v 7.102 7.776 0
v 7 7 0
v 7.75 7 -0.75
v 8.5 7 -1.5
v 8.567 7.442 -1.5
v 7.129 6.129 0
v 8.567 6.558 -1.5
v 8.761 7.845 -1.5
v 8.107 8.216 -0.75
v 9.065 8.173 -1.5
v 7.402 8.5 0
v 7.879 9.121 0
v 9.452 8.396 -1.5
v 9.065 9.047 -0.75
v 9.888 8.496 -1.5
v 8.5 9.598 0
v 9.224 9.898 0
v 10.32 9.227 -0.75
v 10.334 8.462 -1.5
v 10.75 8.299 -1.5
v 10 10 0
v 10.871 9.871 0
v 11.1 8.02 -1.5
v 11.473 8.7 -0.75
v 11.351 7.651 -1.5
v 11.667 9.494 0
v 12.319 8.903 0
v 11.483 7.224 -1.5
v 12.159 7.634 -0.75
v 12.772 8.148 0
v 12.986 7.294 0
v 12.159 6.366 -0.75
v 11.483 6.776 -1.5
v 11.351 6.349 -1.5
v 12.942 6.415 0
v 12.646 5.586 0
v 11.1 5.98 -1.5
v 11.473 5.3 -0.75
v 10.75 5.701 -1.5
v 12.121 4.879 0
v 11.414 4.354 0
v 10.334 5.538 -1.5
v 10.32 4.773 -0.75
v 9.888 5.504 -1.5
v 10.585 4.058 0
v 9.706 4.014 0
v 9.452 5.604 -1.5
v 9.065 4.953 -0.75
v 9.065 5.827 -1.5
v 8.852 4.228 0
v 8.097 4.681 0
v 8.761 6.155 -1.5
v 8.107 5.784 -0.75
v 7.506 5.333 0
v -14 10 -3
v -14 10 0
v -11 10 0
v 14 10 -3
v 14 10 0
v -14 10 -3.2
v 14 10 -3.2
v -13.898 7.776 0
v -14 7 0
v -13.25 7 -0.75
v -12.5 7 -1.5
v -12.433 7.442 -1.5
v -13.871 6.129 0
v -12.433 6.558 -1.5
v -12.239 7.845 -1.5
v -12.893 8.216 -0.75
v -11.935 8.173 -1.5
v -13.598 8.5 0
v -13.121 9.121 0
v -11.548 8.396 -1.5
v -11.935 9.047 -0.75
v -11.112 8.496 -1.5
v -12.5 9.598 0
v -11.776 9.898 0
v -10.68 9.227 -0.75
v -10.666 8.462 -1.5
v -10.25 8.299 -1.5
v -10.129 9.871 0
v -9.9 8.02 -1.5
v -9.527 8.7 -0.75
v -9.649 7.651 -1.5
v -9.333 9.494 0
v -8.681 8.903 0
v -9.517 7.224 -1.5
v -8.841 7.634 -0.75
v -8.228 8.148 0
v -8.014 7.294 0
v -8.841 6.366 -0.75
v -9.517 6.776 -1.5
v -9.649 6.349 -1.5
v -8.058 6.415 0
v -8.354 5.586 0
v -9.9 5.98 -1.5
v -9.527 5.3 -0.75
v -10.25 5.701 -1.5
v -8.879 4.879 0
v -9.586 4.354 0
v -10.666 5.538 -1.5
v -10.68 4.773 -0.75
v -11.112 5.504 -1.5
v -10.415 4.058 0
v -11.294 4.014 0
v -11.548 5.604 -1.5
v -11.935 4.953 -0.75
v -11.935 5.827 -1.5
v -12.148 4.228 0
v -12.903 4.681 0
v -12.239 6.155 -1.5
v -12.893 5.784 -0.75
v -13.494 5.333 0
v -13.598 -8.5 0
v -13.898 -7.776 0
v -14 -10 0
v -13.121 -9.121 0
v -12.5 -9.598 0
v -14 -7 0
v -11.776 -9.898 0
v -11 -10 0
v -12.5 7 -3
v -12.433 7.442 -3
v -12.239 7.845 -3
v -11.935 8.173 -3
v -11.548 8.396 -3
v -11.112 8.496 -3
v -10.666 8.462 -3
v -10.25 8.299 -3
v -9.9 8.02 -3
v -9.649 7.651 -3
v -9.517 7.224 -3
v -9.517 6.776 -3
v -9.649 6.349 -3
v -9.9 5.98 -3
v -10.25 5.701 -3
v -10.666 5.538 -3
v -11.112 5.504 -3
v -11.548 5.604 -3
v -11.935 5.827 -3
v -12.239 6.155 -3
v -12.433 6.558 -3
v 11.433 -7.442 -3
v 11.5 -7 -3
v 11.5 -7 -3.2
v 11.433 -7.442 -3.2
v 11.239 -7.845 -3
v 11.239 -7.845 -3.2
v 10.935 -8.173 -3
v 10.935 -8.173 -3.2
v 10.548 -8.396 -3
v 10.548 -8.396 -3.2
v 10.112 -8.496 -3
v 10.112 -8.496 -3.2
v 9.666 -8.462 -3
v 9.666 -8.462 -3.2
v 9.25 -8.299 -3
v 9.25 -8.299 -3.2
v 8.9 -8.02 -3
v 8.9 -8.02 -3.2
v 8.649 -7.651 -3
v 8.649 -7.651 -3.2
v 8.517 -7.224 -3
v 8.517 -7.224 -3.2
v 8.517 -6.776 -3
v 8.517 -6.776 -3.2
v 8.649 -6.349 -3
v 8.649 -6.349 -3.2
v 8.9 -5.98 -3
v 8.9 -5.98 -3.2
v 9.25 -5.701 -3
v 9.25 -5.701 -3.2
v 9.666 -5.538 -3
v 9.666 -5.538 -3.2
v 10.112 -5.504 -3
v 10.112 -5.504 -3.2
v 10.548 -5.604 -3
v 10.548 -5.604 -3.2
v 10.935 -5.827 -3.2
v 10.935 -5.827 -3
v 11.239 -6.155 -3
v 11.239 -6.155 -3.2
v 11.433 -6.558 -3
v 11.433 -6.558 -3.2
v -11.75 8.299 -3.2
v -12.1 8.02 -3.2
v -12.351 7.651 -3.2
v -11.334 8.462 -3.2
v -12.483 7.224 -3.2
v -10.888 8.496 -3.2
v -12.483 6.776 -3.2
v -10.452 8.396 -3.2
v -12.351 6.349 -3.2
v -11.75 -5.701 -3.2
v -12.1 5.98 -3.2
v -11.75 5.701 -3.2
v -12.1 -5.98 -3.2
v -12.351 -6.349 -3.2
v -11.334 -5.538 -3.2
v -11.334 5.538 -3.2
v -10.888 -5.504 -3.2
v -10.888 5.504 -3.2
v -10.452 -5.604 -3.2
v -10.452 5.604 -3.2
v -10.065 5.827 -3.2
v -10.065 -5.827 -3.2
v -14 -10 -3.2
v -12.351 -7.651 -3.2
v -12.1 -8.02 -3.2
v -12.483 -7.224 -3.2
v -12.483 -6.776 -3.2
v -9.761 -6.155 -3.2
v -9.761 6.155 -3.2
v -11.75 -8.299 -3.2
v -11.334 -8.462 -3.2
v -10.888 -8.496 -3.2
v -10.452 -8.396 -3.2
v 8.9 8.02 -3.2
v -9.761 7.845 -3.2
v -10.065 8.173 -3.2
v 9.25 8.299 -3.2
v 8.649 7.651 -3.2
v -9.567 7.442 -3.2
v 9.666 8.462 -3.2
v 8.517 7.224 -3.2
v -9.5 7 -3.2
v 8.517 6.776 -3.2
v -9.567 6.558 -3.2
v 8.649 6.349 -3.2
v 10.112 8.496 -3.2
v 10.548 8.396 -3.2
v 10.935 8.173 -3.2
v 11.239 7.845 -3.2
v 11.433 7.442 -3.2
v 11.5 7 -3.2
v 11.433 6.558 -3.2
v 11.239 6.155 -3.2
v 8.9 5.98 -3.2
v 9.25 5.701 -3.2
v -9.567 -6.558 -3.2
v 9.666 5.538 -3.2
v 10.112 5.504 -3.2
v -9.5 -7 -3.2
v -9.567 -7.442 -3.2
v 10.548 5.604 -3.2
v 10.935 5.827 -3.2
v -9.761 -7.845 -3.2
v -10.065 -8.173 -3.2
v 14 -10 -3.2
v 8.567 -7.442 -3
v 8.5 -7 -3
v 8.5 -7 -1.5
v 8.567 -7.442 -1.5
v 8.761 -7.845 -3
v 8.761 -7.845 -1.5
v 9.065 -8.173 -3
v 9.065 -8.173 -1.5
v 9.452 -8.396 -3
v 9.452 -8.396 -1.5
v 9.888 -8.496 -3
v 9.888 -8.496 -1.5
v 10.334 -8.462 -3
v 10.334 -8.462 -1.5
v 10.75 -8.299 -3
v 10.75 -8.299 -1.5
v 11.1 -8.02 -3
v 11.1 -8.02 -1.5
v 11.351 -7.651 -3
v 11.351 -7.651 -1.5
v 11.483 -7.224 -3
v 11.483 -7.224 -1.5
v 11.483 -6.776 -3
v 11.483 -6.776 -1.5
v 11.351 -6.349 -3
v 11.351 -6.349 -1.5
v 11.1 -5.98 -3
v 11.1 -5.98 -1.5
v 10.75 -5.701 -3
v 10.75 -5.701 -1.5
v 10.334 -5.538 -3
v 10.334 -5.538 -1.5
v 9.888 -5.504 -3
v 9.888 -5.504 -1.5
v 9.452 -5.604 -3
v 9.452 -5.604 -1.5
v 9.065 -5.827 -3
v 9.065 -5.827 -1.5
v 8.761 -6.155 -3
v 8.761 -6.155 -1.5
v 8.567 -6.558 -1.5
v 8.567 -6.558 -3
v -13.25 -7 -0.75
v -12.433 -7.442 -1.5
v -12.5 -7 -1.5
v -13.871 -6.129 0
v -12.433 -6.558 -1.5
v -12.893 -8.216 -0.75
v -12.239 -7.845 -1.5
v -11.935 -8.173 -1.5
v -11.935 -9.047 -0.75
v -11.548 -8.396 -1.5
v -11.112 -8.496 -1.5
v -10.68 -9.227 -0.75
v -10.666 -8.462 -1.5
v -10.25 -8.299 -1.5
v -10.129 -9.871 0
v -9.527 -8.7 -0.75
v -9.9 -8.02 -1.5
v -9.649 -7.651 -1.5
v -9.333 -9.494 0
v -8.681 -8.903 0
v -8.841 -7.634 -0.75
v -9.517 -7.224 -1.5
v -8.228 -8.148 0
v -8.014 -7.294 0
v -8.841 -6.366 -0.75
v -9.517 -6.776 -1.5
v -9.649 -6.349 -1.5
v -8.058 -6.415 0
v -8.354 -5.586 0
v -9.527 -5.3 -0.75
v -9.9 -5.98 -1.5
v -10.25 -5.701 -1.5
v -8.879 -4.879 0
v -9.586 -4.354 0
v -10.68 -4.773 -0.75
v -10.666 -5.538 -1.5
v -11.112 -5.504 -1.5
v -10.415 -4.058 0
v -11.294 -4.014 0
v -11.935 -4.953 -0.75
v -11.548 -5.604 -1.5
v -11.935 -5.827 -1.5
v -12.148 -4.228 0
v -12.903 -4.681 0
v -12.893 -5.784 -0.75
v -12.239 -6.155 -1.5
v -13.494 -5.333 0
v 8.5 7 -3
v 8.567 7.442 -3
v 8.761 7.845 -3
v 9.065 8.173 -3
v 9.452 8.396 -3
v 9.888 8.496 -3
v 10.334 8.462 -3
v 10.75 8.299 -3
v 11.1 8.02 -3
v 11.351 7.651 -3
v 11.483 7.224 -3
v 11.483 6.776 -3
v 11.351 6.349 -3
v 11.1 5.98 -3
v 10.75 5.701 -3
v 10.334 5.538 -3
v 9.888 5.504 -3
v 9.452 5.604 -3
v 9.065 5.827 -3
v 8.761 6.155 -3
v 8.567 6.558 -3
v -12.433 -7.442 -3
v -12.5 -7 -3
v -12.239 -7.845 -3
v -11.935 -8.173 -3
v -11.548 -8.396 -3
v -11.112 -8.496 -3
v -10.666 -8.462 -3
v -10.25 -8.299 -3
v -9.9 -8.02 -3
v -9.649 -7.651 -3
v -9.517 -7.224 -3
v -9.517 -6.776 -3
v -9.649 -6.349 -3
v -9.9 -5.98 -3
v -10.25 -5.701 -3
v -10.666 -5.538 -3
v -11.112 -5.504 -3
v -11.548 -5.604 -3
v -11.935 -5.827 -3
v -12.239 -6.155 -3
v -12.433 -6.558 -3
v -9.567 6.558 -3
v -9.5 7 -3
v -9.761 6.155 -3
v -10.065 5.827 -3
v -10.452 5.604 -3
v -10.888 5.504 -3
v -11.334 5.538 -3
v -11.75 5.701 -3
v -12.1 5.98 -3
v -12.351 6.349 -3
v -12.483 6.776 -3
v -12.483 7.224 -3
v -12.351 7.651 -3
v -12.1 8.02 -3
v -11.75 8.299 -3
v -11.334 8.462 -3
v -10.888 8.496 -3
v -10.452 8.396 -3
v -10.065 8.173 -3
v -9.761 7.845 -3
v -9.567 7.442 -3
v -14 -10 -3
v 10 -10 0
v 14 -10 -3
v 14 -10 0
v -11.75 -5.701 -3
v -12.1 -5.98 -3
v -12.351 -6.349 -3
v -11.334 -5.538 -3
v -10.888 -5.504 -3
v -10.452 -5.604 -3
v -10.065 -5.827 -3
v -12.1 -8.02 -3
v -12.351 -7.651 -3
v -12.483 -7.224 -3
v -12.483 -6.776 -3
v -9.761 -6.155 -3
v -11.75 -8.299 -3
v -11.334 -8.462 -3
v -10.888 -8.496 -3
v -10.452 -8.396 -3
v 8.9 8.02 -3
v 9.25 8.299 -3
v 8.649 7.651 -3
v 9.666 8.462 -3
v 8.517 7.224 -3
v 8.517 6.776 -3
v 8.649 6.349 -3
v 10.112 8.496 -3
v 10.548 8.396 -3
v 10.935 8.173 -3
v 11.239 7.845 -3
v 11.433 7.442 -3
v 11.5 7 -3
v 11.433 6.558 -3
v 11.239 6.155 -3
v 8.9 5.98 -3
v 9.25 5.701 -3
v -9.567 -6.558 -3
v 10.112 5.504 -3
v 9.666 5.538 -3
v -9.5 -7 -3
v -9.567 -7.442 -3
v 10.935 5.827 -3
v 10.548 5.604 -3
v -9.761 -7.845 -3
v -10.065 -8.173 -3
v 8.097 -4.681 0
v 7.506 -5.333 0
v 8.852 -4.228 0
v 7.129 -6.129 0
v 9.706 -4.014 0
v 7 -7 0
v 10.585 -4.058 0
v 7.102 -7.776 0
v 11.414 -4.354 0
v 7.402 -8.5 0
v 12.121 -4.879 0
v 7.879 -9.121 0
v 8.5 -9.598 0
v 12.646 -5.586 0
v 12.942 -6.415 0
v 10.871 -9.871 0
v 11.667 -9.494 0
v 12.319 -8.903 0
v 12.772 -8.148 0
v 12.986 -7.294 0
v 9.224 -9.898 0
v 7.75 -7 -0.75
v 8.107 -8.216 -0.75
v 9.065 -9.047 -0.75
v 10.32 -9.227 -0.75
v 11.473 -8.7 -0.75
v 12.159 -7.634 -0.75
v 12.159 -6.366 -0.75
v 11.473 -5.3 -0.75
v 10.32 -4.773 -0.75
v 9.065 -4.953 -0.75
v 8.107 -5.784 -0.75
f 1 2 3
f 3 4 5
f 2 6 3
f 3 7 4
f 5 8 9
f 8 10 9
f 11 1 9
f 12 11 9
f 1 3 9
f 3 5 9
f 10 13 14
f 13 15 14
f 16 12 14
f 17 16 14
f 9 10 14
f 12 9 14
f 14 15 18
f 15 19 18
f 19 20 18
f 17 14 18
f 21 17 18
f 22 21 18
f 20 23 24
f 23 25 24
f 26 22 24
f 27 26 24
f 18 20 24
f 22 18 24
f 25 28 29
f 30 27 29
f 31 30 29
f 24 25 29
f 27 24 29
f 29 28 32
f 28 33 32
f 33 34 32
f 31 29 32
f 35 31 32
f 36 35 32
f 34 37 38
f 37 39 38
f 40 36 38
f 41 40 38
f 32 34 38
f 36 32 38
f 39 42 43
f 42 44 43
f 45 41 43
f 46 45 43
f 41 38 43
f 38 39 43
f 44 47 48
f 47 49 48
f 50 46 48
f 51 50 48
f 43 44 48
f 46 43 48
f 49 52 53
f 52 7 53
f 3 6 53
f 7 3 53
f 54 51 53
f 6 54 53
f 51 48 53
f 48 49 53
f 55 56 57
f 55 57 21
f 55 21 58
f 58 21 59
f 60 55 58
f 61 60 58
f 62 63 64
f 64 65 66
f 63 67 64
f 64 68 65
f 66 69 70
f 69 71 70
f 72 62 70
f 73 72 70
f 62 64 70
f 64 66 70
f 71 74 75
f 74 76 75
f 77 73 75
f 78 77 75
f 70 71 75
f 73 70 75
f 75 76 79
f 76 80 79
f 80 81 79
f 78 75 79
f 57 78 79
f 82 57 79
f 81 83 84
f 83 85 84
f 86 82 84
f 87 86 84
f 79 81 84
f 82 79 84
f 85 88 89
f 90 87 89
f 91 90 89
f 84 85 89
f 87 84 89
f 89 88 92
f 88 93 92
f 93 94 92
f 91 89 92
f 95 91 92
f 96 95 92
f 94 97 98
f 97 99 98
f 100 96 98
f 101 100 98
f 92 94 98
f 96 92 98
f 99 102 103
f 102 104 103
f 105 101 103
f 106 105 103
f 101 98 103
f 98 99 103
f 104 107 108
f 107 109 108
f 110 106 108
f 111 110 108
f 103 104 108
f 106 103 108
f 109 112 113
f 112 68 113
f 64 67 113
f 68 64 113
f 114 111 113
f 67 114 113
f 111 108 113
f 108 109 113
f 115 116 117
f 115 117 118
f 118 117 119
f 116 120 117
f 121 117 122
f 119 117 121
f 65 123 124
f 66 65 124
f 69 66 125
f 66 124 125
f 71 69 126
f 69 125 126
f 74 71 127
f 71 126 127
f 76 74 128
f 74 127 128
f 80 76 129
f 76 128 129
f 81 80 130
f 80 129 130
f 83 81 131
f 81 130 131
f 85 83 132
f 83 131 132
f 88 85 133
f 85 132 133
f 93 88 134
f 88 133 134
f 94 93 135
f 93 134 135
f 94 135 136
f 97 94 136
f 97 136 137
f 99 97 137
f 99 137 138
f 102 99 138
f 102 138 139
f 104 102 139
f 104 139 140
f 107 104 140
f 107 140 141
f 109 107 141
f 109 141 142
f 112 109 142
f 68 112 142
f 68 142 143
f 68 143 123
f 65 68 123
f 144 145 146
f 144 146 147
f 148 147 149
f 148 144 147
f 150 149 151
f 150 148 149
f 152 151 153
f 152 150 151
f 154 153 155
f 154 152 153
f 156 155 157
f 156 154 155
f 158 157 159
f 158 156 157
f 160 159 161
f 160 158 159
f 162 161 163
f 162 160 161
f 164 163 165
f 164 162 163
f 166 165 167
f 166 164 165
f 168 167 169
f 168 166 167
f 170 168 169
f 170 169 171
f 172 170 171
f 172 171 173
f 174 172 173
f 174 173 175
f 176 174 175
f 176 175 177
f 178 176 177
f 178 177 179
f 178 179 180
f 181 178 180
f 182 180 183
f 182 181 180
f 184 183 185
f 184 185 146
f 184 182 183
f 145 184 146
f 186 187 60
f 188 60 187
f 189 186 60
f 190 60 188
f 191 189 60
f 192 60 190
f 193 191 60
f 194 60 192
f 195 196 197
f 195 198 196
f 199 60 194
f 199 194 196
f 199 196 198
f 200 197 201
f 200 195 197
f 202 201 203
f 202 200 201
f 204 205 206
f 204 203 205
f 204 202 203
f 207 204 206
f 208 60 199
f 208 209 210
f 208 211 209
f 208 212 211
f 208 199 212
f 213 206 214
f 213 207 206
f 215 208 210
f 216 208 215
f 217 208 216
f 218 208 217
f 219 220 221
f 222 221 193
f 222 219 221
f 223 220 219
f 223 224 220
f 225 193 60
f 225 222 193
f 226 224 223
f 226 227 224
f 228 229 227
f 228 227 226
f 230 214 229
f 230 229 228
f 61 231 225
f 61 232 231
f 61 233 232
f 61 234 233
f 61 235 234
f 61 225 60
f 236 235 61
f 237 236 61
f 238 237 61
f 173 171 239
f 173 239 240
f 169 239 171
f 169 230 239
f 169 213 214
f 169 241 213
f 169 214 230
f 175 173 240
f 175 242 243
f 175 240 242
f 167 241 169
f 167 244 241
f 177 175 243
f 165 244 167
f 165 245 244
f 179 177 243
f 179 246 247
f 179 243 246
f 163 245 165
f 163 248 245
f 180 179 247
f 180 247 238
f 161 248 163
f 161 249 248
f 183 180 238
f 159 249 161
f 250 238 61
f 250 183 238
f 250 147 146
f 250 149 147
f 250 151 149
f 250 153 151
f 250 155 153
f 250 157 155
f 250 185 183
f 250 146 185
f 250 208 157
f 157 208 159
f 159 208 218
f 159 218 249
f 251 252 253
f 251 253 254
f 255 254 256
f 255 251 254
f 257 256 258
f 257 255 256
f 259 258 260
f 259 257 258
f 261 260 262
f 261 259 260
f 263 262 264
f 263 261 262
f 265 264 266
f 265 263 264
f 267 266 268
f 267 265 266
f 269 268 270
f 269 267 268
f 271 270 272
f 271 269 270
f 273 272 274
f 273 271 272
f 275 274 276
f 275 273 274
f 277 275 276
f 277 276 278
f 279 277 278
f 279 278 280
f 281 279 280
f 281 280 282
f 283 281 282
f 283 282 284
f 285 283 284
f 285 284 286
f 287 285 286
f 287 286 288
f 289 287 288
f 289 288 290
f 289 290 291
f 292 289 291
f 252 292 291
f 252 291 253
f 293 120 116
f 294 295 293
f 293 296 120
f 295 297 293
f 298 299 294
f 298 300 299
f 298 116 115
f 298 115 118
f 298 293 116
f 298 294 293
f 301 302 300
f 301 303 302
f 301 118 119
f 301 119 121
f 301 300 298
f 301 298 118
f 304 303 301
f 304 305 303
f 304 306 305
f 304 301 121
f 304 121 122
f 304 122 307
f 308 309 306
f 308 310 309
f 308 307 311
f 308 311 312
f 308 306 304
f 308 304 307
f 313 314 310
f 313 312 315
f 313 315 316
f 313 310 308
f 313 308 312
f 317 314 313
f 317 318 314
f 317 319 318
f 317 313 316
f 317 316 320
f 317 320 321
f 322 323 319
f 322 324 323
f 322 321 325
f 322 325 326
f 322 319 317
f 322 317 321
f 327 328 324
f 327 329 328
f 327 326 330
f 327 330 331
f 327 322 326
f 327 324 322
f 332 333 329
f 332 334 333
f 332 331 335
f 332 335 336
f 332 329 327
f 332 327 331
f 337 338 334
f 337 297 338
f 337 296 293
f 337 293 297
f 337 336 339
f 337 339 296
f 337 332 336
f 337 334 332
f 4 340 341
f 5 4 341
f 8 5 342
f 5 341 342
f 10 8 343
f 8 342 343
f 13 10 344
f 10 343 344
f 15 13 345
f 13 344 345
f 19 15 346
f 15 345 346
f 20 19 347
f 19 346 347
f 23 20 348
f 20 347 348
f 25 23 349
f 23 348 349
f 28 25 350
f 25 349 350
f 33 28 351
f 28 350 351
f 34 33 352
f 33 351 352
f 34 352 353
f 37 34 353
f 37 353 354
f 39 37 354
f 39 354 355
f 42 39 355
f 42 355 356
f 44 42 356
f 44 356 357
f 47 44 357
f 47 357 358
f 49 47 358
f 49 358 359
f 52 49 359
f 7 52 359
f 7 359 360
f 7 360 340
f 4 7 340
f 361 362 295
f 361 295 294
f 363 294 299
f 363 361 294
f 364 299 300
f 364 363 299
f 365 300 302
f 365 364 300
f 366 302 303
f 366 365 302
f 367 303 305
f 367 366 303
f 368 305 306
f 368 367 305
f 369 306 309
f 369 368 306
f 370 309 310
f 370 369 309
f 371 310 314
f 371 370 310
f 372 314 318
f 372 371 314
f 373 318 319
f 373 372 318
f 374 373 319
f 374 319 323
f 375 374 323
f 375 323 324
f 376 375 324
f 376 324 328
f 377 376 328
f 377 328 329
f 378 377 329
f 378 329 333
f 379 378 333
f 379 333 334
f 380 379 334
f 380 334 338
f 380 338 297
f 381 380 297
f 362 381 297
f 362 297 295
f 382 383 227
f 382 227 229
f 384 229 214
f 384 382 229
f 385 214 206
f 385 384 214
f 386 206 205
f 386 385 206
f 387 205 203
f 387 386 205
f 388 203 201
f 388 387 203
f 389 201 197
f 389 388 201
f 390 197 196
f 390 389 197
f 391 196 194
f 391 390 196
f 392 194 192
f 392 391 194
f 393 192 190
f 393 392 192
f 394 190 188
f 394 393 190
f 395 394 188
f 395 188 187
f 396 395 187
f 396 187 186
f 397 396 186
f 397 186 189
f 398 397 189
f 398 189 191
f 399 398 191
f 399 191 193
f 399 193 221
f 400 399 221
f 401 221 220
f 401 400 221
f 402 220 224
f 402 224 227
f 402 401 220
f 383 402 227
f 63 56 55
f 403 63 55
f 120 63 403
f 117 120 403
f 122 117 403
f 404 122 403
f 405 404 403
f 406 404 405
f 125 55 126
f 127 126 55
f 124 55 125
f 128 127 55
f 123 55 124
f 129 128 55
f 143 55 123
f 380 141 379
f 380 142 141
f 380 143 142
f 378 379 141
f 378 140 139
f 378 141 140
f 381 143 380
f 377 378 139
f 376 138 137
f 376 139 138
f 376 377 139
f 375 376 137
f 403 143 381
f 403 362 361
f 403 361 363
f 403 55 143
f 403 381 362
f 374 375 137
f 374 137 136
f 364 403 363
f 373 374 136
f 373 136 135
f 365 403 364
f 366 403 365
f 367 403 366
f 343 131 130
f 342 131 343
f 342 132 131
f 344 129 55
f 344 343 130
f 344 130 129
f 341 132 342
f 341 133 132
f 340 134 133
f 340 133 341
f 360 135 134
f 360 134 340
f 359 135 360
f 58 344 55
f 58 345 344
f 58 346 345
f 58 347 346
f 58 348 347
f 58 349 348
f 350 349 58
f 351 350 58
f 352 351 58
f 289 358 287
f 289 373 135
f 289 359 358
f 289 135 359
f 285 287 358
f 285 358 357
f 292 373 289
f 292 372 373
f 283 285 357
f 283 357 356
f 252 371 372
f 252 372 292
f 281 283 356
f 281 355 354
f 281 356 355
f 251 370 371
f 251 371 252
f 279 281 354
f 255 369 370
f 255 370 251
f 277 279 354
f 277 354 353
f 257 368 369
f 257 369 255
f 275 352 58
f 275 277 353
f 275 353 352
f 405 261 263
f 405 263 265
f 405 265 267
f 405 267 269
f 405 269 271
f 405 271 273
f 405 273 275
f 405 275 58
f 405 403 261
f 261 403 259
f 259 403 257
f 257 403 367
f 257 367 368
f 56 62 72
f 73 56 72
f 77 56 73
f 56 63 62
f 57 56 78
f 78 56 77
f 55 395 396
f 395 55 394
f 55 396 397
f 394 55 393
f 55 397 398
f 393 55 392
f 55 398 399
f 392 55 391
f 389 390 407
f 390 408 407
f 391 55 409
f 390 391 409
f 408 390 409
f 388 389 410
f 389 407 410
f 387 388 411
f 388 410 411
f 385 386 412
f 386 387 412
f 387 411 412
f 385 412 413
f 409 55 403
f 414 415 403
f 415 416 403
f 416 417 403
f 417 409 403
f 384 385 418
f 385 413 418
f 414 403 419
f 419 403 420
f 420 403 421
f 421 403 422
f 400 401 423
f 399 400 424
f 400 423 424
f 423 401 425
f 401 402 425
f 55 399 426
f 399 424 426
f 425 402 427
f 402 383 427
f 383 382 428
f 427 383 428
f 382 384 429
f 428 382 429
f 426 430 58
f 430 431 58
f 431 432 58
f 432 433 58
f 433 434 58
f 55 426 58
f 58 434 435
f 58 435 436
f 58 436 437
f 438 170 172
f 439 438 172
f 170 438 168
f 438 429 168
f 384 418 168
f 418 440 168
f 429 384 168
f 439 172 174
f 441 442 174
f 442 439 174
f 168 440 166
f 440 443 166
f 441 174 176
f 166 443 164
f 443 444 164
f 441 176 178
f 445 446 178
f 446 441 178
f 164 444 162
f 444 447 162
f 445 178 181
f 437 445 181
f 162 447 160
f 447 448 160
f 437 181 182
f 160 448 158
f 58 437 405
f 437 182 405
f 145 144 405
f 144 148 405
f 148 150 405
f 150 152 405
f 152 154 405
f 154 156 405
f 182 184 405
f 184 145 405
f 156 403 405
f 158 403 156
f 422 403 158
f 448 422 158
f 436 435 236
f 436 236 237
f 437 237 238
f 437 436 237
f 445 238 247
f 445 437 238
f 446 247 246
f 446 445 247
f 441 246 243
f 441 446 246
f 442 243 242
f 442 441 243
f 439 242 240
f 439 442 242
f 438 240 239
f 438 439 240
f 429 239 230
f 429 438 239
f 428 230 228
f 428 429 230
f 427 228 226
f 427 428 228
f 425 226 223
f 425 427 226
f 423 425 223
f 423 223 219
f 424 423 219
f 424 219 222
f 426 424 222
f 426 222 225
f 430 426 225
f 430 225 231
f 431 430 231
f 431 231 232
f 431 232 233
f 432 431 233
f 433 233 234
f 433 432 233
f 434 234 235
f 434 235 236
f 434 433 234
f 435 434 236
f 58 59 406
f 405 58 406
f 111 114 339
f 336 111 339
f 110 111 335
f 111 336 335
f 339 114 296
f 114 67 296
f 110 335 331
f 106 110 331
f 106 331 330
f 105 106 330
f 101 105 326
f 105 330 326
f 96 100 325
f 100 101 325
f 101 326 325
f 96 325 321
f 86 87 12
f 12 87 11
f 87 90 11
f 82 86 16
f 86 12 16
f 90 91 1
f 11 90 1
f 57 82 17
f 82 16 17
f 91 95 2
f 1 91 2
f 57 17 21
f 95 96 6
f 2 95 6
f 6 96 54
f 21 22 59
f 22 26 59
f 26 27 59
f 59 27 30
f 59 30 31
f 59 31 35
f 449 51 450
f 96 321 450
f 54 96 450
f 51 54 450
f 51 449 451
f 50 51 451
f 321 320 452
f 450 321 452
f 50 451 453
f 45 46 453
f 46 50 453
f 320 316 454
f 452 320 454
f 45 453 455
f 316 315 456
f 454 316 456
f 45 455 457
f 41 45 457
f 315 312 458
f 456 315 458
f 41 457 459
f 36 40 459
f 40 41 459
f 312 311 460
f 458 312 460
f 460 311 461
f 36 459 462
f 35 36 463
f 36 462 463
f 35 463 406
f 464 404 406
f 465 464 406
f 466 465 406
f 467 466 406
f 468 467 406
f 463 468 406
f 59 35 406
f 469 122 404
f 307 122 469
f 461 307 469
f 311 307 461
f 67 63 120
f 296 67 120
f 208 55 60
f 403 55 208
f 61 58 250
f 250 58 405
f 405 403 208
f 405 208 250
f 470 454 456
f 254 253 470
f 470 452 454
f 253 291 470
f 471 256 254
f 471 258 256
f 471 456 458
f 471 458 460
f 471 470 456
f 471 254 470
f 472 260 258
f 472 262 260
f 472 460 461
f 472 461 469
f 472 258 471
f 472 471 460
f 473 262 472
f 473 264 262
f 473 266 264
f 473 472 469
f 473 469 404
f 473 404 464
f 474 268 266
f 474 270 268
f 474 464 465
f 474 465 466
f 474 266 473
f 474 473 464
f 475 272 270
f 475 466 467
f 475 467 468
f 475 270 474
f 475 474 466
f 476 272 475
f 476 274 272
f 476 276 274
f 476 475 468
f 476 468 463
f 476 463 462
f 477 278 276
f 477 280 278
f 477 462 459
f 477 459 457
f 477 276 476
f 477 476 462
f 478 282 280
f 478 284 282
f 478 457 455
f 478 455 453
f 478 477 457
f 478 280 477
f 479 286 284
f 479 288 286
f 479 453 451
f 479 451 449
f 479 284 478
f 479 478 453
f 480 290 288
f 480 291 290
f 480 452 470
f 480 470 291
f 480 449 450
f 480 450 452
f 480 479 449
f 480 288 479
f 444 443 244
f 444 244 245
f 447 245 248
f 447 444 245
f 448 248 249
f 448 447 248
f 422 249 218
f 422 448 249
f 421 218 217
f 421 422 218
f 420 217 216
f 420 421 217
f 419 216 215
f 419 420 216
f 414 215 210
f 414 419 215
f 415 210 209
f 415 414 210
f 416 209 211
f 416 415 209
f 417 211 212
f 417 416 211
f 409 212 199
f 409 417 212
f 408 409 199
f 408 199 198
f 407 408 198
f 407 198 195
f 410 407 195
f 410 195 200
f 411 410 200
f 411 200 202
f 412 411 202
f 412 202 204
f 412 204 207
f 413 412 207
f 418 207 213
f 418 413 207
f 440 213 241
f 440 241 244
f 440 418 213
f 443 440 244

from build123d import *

# Parameters (mm, degrees)
F0_W           = 28
F0_H           = 10
F1_DEPTH       = 3
F2_D           = 3
F2_DEPTH       = 3
F2_CSINK_D     = 6
F2_CSINK_ANGLE = 90
F4_W           = 28
F4_H           = 20
F4_R           = 1.5
F5_DEPTH       = 0.2


with BuildPart() as f1:
    # F0 (on Top) → F1 (new body)
    with BuildSketch(Plane.XY):
        with Locations((0, 5)):
            Rectangle(F0_W, F0_H)
    extrude(amount=-F1_DEPTH)

    # F2
    with Locations(Plane.XY):
        with Locations((-11, 7), (10, 7)):
            CounterSinkHole(F2_D / 2, F2_CSINK_D / 2, depth=F2_DEPTH, counter_sink_angle=F2_CSINK_ANGLE)

    # F3: F1 across plane


with BuildPart() as f1_1:
    add(f1.part)
    add(f1.part.mirror(Plane.XZ))


with BuildPart() as f5:
    # F4 (on face) → F5 (new body)
    with BuildSketch(Plane(origin=(0, 0, -3), x_dir=(1, 0, 0), z_dir=(0, 0, -1))):
        Rectangle(F4_W, F4_H)
        with Locations((-11, -7)):
            Circle(F4_R, mode=Mode.SUBTRACT)
        with Locations((10, -7)):
            Circle(F4_R, mode=Mode.SUBTRACT)
        with Locations((-11, 7)):
            Circle(F4_R, mode=Mode.SUBTRACT)
        with Locations((10, 7)):
            Circle(F4_R, mode=Mode.SUBTRACT)
    extrude(amount=F5_DEPTH)


solid = Compound([f1_1.part, f5.part])
